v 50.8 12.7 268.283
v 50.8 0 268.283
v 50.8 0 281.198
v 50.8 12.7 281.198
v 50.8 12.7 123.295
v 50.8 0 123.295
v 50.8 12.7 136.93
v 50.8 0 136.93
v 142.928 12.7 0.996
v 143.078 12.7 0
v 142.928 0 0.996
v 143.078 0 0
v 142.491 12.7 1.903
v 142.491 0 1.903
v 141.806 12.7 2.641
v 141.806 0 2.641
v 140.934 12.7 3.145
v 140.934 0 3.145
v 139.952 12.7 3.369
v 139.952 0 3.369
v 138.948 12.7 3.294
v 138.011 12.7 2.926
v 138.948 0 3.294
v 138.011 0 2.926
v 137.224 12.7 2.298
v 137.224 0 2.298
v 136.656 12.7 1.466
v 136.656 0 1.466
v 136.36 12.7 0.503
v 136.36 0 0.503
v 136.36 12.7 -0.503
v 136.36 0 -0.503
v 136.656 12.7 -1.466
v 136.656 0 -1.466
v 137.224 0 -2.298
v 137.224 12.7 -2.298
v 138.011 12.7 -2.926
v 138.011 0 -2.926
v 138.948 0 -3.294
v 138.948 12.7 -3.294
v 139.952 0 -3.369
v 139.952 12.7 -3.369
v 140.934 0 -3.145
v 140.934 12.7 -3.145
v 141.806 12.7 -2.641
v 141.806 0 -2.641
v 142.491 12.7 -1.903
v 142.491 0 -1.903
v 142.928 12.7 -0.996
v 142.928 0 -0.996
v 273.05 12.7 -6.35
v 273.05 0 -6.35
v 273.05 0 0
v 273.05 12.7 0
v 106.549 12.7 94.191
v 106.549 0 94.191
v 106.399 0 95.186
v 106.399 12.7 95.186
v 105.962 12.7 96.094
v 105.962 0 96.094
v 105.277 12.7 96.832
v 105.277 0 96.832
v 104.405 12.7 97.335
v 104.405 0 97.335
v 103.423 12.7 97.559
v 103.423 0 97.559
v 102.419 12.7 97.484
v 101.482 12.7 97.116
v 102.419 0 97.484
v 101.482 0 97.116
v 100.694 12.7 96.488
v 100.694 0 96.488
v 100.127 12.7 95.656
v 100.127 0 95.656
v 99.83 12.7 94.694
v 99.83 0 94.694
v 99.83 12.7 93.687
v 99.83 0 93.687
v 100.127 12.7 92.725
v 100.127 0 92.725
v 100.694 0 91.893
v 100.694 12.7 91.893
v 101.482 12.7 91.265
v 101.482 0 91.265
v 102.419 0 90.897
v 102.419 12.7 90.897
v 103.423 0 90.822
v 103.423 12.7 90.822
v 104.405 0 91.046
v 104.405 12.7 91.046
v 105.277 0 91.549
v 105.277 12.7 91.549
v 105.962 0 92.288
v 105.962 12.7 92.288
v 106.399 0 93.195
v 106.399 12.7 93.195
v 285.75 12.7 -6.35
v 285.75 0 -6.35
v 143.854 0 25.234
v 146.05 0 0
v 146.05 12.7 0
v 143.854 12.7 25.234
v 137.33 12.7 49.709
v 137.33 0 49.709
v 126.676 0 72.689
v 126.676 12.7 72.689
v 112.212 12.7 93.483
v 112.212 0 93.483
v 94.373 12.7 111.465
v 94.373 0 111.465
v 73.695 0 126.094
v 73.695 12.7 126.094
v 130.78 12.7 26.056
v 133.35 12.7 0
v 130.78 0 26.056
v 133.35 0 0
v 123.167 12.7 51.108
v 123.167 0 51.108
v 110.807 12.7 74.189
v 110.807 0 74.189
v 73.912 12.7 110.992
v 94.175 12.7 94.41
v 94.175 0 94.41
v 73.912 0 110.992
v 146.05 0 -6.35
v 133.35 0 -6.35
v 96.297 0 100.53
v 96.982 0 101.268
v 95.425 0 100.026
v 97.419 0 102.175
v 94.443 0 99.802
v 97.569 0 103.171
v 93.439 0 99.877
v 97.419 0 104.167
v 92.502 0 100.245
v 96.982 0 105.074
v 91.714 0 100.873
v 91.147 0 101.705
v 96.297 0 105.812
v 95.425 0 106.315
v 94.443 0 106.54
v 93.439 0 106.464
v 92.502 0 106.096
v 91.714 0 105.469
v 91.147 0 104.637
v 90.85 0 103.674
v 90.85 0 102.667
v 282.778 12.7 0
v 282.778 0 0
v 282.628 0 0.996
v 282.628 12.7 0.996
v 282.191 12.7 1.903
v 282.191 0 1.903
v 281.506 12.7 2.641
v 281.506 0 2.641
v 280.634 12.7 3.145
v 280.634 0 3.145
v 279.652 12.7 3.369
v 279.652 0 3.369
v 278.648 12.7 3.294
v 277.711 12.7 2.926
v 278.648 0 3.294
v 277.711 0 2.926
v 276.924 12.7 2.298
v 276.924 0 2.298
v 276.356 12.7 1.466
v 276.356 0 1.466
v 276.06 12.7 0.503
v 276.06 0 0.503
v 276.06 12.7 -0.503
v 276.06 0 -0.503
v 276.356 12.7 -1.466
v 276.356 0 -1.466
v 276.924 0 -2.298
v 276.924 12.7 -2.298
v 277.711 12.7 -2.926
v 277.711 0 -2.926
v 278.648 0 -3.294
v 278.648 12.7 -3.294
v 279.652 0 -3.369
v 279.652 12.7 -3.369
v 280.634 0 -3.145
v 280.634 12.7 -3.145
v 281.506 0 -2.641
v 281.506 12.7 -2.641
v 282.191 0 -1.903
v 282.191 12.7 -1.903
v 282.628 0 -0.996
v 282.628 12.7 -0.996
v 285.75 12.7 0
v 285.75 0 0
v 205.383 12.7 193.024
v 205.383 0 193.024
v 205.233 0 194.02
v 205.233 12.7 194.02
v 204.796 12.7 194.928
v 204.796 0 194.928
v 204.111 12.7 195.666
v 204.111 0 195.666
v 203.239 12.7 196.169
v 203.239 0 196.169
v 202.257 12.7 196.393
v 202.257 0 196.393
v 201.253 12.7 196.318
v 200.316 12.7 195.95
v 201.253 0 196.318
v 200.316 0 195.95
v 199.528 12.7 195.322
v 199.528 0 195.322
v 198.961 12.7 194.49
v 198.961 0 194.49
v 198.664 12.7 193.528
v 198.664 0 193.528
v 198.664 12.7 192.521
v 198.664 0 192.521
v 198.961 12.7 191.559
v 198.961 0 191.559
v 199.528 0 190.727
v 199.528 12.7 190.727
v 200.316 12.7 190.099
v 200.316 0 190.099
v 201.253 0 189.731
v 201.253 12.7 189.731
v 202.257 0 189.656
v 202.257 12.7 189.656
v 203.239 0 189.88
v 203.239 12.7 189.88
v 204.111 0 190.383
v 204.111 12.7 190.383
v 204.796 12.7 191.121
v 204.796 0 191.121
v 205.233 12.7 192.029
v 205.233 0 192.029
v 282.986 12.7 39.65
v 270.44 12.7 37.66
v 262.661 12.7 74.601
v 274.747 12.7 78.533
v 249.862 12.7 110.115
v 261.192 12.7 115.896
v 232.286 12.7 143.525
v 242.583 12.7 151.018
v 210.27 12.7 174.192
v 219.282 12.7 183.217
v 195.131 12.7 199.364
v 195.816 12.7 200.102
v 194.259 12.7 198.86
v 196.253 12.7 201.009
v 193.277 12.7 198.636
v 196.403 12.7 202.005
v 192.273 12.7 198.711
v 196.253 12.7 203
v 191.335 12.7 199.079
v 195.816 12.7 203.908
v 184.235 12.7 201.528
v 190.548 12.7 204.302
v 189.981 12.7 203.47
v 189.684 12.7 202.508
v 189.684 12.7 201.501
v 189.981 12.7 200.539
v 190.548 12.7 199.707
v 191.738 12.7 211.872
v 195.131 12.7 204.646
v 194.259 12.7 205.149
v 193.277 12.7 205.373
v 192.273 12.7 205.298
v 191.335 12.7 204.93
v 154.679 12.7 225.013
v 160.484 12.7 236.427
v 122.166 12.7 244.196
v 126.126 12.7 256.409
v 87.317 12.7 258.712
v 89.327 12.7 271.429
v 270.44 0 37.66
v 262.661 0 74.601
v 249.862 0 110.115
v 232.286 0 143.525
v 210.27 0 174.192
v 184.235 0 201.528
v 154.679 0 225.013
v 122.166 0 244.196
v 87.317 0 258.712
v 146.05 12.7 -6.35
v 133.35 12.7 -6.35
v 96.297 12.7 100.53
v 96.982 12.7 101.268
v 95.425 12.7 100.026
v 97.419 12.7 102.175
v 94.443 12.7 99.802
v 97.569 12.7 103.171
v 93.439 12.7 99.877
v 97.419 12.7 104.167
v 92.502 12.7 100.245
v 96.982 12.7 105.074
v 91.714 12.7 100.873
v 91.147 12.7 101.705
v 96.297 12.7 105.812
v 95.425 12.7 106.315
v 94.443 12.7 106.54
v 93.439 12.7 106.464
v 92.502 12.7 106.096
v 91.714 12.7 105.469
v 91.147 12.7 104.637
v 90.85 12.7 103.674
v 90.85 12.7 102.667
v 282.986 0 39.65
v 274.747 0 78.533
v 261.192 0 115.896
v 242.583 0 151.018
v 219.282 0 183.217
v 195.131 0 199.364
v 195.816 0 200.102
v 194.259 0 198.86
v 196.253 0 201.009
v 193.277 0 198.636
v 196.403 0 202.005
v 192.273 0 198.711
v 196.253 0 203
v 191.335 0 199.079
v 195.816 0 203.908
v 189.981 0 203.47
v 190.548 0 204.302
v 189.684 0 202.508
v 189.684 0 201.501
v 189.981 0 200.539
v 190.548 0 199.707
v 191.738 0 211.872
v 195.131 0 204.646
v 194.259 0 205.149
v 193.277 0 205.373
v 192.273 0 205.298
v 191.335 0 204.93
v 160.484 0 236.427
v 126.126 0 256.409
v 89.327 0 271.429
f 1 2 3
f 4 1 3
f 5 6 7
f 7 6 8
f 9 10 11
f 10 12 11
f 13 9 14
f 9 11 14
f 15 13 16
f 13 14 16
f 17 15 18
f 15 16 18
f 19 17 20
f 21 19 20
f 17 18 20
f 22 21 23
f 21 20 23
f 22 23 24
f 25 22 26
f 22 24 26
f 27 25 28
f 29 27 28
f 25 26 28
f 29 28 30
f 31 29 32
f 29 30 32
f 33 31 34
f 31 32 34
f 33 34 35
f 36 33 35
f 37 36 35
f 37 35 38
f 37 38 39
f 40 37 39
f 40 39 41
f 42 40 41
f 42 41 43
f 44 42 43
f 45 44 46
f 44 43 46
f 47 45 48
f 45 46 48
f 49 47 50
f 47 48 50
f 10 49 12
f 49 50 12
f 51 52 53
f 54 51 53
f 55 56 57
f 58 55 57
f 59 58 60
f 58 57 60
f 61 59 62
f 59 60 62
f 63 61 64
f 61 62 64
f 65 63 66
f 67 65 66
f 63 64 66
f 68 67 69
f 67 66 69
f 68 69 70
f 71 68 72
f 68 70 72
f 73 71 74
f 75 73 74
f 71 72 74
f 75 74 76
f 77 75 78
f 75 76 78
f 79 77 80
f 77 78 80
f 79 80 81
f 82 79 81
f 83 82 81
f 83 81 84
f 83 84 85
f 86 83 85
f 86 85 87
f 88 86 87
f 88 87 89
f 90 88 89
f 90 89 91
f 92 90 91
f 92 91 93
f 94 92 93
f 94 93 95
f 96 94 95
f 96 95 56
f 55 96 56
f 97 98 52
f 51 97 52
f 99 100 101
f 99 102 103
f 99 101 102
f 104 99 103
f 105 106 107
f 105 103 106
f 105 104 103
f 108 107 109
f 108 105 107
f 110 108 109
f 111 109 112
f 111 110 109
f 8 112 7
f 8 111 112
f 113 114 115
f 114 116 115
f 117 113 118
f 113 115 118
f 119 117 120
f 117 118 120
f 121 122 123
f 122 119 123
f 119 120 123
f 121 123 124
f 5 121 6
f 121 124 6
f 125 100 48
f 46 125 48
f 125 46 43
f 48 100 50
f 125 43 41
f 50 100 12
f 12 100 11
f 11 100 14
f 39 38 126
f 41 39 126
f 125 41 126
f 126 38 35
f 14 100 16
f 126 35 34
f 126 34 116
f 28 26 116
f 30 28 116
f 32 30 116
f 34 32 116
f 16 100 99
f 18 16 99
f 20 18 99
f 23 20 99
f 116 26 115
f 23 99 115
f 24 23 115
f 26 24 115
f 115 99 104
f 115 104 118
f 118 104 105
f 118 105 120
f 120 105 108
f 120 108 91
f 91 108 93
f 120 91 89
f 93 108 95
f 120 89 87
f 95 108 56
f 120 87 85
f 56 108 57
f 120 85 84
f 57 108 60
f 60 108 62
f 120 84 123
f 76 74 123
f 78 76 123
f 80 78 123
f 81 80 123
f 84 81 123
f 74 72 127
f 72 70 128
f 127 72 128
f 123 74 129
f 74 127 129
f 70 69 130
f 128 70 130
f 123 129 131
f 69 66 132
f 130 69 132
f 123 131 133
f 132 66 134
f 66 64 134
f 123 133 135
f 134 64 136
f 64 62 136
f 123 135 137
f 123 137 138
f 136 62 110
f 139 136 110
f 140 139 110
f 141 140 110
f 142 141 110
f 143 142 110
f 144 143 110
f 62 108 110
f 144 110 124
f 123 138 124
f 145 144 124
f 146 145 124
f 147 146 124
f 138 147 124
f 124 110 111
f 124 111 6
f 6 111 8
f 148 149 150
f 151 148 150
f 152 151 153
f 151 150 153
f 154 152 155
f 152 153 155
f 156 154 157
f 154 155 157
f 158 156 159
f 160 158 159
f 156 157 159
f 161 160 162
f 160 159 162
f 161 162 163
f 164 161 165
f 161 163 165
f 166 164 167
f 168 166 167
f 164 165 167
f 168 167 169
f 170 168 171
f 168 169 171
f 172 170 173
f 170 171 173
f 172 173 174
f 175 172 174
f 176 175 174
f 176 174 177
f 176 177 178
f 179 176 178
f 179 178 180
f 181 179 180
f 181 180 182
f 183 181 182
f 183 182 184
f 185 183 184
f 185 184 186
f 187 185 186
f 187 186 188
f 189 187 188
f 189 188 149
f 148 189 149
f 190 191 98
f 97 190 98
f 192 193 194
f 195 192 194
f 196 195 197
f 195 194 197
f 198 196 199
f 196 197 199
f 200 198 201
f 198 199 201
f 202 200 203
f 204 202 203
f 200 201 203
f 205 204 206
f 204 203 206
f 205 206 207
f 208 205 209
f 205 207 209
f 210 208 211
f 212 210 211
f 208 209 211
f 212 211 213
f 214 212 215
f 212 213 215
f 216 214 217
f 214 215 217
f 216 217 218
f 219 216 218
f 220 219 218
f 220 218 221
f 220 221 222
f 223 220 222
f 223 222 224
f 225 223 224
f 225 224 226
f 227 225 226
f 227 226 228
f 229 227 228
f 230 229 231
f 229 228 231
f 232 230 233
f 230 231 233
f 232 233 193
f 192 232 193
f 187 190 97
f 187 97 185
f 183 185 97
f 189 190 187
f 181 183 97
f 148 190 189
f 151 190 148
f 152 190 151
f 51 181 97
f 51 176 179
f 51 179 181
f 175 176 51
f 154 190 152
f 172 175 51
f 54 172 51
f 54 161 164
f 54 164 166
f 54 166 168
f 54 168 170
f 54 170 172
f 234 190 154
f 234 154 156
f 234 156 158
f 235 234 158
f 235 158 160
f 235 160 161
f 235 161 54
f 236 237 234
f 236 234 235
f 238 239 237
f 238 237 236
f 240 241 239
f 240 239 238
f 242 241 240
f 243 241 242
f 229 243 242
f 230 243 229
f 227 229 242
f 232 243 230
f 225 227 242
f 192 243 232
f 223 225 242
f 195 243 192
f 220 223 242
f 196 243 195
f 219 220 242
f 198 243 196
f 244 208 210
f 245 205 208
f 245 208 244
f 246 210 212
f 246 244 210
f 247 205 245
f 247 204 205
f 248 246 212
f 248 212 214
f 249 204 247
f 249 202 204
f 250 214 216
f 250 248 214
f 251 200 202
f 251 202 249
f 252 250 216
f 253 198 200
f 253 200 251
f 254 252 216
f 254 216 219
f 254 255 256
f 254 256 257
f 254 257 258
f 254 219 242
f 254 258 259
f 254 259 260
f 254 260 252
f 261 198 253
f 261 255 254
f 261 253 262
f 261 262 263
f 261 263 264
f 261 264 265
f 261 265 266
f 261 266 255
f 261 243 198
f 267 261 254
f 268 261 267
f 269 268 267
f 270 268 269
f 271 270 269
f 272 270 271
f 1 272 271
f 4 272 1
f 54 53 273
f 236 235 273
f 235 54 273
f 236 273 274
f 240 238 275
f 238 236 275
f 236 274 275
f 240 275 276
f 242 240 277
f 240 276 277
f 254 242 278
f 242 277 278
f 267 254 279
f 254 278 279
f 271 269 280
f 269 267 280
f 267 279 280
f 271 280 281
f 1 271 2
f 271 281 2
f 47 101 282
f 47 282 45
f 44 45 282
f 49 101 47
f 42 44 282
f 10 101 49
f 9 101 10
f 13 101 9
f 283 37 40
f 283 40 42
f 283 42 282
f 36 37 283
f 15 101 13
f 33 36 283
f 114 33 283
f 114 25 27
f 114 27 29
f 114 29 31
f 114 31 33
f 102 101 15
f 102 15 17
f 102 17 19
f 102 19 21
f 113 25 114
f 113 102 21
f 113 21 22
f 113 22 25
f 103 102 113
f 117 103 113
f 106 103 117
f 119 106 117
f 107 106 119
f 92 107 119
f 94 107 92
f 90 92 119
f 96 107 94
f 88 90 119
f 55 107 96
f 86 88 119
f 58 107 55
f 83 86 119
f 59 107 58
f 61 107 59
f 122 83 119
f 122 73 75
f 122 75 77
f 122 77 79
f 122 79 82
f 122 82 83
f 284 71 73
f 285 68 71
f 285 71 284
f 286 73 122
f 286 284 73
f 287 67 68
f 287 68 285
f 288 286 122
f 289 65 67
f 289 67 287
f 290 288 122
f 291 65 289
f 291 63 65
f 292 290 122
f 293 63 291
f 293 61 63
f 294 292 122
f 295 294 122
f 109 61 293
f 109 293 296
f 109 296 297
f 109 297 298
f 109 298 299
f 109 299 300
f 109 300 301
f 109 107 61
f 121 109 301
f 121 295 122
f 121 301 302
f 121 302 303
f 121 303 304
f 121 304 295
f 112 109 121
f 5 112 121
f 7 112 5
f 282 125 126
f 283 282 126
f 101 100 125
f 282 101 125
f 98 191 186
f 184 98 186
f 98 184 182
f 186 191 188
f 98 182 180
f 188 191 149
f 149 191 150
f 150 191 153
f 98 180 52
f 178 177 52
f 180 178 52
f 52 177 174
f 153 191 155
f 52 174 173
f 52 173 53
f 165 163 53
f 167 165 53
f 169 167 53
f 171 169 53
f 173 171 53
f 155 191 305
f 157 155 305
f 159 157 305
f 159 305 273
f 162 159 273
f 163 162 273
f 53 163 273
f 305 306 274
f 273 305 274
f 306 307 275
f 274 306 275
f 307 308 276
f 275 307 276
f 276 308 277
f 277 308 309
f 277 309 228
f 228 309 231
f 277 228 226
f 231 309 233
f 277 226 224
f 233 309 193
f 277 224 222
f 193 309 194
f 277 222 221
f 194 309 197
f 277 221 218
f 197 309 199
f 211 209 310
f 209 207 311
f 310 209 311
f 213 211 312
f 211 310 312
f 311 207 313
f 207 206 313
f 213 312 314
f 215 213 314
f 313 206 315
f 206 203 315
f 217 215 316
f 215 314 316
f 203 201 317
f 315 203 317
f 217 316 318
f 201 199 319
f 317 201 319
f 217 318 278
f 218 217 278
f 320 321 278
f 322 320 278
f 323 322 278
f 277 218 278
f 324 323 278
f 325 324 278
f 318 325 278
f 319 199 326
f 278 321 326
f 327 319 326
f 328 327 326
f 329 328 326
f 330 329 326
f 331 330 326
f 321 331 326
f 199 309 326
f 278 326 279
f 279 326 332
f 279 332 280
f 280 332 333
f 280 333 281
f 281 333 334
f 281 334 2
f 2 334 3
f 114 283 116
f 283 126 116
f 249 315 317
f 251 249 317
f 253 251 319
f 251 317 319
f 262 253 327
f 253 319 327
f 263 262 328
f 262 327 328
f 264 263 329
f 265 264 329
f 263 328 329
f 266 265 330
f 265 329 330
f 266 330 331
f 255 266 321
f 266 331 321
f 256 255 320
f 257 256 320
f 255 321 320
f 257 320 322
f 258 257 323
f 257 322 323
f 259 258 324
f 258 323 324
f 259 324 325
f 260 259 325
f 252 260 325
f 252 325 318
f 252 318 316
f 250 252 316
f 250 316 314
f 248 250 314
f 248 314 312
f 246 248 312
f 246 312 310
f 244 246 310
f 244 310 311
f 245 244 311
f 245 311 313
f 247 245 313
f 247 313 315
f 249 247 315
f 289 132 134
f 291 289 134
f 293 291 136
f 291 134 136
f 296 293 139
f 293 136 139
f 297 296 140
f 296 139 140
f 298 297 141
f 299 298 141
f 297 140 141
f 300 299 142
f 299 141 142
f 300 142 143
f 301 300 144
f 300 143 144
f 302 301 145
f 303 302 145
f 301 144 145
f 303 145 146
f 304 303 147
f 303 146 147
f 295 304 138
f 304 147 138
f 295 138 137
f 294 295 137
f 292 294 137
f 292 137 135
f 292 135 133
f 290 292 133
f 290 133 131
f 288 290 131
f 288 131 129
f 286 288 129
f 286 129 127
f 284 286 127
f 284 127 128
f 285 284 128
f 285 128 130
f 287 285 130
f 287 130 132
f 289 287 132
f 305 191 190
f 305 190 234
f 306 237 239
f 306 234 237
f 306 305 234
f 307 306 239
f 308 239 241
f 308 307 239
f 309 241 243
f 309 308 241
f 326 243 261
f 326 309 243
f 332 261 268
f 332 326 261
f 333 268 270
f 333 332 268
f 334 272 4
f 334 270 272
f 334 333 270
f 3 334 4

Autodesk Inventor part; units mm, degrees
ref_plane "YZ Plane" through (0, 0, 0) normal (1, 0, 0) x (0, 1, 0)
ref_plane "XZ Plane" through (0, 0, 0) normal (0, 1, 0) x (-1, 0, 0)
ref_plane "XY Plane" through (0, 0, 0) normal (0, 0, 1) x (1, 0, 0)
sketch "Sketch1" plane through (0, 0, 0) normal (0, 1, 0) x (-1, 0, 0)
  circle A0 centre (-193.0245, 202.0047) radius 4.7625
  circle A1 centre (-279.4, 0) radius 4.7625
  circle A2 centre (-202.0047, 193.0245) radius 4.7625
  arc A3 (-50.8, 268.2828) -> (-273.05, 0) centre (0, 0) ccw
  arc A4 (-50.8, 281.1982) -> (-285.75, 0) centre (0, 0) ccw
  line L0 (-285.75, 0) -> (-285.75, -6.35)
  line L1 (-285.75, -6.35) -> (-273.05, -6.35)
  line L2 (-273.05, -6.35) -> (-273.05, 0)
  circle A5 centre (-94.1906, 103.1708) radius 4.7625
  circle A6 centre (-139.7, 0) radius 4.7625
  circle A7 centre (-103.1708, 94.1906) radius 4.7625
  arc A8 (-50.8, 136.9305) -> (-146.05, 0) centre (0, 0) ccw
  line L3 (-146.05, 0) -> (-146.05, -6.35)
  line L4 (-146.05, -6.35) -> (-133.35, -6.35)
  line L5 (-133.35, -6.35) -> (-133.35, 0)
  arc A9 (-50.8, 123.2947) -> (-133.35, 0) centre (0, 0) ccw
  line L6 (-50.8, 123.2947) -> (-50.8, 136.9305)
  line L7 (-50.8, 268.2828) -> (-50.8, 281.1982)
extrude "Extrusion1" add sketch "Sketch1" along normal blind 12.7
sketch "Sketch2" plane through (0, 0, 0) normal (0, -1, 0) x (1, 0, 0)
  circle A0 centre (202.0047, 193.0245) radius 4.7625 projected
  circle A1 centre (193.0245, 202.0047) radius 4.7625 projected
  circle A2 centre (279.4, 0) radius 4.7625 projected
  arc A3 (133.35, 0) -> (50.8, 123.2947) centre (0, 0) ccw projected
  circle A4 centre (103.1708, 94.1906) radius 4.7625 projected
  circle A5 centre (94.1906, 103.1708) radius 4.7625 projected
  circle A6 centre (139.7, 0) radius 4.7625 projected
  arc A7 (146.05, 0) -> (50.8, 136.9305) centre (0, 0) ccw projected
  line L0 (50.8, 136.9305) -> (50.8, 123.2947) projected
  arc A8 (133.35, 0) -> (50.8, 123.2947) centre (0, 0) ccw projected
  line L1 (133.35, 0) -> (133.35, -6.35) projected
  line L2 (133.35, -6.35) -> (146.05, -6.35) projected
  line L3 (146.05, -6.35) -> (146.05, 0) projected
  circle A9 centre (202.0047, 193.0245) radius 3.3782
  circle A10 centre (193.0245, 202.0047) radius 3.3782
  circle A11 centre (279.4, 0) radius 3.3782
  circle A12 centre (139.7, 0) radius 3.3782
  circle A13 centre (94.1906, 103.1708) radius 3.3782
  circle A14 centre (103.1708, 94.1906) radius 3.3782
  dimension "d3" = 6.7564
  dimension "d4" = 6.7564
  dimension "d5" = 6.7564
  dimension "d6" = 6.7564
  dimension "d7" = 6.7564
  dimension "d8" = 6.7564
extrude "Extrusion2" add sketch "Sketch2" against normal blind 12.7 contours A0 | A1 | A2 | A4 | A5 | A6
properties part number "Upper Rails" material "Polycarbonate, Clear"
